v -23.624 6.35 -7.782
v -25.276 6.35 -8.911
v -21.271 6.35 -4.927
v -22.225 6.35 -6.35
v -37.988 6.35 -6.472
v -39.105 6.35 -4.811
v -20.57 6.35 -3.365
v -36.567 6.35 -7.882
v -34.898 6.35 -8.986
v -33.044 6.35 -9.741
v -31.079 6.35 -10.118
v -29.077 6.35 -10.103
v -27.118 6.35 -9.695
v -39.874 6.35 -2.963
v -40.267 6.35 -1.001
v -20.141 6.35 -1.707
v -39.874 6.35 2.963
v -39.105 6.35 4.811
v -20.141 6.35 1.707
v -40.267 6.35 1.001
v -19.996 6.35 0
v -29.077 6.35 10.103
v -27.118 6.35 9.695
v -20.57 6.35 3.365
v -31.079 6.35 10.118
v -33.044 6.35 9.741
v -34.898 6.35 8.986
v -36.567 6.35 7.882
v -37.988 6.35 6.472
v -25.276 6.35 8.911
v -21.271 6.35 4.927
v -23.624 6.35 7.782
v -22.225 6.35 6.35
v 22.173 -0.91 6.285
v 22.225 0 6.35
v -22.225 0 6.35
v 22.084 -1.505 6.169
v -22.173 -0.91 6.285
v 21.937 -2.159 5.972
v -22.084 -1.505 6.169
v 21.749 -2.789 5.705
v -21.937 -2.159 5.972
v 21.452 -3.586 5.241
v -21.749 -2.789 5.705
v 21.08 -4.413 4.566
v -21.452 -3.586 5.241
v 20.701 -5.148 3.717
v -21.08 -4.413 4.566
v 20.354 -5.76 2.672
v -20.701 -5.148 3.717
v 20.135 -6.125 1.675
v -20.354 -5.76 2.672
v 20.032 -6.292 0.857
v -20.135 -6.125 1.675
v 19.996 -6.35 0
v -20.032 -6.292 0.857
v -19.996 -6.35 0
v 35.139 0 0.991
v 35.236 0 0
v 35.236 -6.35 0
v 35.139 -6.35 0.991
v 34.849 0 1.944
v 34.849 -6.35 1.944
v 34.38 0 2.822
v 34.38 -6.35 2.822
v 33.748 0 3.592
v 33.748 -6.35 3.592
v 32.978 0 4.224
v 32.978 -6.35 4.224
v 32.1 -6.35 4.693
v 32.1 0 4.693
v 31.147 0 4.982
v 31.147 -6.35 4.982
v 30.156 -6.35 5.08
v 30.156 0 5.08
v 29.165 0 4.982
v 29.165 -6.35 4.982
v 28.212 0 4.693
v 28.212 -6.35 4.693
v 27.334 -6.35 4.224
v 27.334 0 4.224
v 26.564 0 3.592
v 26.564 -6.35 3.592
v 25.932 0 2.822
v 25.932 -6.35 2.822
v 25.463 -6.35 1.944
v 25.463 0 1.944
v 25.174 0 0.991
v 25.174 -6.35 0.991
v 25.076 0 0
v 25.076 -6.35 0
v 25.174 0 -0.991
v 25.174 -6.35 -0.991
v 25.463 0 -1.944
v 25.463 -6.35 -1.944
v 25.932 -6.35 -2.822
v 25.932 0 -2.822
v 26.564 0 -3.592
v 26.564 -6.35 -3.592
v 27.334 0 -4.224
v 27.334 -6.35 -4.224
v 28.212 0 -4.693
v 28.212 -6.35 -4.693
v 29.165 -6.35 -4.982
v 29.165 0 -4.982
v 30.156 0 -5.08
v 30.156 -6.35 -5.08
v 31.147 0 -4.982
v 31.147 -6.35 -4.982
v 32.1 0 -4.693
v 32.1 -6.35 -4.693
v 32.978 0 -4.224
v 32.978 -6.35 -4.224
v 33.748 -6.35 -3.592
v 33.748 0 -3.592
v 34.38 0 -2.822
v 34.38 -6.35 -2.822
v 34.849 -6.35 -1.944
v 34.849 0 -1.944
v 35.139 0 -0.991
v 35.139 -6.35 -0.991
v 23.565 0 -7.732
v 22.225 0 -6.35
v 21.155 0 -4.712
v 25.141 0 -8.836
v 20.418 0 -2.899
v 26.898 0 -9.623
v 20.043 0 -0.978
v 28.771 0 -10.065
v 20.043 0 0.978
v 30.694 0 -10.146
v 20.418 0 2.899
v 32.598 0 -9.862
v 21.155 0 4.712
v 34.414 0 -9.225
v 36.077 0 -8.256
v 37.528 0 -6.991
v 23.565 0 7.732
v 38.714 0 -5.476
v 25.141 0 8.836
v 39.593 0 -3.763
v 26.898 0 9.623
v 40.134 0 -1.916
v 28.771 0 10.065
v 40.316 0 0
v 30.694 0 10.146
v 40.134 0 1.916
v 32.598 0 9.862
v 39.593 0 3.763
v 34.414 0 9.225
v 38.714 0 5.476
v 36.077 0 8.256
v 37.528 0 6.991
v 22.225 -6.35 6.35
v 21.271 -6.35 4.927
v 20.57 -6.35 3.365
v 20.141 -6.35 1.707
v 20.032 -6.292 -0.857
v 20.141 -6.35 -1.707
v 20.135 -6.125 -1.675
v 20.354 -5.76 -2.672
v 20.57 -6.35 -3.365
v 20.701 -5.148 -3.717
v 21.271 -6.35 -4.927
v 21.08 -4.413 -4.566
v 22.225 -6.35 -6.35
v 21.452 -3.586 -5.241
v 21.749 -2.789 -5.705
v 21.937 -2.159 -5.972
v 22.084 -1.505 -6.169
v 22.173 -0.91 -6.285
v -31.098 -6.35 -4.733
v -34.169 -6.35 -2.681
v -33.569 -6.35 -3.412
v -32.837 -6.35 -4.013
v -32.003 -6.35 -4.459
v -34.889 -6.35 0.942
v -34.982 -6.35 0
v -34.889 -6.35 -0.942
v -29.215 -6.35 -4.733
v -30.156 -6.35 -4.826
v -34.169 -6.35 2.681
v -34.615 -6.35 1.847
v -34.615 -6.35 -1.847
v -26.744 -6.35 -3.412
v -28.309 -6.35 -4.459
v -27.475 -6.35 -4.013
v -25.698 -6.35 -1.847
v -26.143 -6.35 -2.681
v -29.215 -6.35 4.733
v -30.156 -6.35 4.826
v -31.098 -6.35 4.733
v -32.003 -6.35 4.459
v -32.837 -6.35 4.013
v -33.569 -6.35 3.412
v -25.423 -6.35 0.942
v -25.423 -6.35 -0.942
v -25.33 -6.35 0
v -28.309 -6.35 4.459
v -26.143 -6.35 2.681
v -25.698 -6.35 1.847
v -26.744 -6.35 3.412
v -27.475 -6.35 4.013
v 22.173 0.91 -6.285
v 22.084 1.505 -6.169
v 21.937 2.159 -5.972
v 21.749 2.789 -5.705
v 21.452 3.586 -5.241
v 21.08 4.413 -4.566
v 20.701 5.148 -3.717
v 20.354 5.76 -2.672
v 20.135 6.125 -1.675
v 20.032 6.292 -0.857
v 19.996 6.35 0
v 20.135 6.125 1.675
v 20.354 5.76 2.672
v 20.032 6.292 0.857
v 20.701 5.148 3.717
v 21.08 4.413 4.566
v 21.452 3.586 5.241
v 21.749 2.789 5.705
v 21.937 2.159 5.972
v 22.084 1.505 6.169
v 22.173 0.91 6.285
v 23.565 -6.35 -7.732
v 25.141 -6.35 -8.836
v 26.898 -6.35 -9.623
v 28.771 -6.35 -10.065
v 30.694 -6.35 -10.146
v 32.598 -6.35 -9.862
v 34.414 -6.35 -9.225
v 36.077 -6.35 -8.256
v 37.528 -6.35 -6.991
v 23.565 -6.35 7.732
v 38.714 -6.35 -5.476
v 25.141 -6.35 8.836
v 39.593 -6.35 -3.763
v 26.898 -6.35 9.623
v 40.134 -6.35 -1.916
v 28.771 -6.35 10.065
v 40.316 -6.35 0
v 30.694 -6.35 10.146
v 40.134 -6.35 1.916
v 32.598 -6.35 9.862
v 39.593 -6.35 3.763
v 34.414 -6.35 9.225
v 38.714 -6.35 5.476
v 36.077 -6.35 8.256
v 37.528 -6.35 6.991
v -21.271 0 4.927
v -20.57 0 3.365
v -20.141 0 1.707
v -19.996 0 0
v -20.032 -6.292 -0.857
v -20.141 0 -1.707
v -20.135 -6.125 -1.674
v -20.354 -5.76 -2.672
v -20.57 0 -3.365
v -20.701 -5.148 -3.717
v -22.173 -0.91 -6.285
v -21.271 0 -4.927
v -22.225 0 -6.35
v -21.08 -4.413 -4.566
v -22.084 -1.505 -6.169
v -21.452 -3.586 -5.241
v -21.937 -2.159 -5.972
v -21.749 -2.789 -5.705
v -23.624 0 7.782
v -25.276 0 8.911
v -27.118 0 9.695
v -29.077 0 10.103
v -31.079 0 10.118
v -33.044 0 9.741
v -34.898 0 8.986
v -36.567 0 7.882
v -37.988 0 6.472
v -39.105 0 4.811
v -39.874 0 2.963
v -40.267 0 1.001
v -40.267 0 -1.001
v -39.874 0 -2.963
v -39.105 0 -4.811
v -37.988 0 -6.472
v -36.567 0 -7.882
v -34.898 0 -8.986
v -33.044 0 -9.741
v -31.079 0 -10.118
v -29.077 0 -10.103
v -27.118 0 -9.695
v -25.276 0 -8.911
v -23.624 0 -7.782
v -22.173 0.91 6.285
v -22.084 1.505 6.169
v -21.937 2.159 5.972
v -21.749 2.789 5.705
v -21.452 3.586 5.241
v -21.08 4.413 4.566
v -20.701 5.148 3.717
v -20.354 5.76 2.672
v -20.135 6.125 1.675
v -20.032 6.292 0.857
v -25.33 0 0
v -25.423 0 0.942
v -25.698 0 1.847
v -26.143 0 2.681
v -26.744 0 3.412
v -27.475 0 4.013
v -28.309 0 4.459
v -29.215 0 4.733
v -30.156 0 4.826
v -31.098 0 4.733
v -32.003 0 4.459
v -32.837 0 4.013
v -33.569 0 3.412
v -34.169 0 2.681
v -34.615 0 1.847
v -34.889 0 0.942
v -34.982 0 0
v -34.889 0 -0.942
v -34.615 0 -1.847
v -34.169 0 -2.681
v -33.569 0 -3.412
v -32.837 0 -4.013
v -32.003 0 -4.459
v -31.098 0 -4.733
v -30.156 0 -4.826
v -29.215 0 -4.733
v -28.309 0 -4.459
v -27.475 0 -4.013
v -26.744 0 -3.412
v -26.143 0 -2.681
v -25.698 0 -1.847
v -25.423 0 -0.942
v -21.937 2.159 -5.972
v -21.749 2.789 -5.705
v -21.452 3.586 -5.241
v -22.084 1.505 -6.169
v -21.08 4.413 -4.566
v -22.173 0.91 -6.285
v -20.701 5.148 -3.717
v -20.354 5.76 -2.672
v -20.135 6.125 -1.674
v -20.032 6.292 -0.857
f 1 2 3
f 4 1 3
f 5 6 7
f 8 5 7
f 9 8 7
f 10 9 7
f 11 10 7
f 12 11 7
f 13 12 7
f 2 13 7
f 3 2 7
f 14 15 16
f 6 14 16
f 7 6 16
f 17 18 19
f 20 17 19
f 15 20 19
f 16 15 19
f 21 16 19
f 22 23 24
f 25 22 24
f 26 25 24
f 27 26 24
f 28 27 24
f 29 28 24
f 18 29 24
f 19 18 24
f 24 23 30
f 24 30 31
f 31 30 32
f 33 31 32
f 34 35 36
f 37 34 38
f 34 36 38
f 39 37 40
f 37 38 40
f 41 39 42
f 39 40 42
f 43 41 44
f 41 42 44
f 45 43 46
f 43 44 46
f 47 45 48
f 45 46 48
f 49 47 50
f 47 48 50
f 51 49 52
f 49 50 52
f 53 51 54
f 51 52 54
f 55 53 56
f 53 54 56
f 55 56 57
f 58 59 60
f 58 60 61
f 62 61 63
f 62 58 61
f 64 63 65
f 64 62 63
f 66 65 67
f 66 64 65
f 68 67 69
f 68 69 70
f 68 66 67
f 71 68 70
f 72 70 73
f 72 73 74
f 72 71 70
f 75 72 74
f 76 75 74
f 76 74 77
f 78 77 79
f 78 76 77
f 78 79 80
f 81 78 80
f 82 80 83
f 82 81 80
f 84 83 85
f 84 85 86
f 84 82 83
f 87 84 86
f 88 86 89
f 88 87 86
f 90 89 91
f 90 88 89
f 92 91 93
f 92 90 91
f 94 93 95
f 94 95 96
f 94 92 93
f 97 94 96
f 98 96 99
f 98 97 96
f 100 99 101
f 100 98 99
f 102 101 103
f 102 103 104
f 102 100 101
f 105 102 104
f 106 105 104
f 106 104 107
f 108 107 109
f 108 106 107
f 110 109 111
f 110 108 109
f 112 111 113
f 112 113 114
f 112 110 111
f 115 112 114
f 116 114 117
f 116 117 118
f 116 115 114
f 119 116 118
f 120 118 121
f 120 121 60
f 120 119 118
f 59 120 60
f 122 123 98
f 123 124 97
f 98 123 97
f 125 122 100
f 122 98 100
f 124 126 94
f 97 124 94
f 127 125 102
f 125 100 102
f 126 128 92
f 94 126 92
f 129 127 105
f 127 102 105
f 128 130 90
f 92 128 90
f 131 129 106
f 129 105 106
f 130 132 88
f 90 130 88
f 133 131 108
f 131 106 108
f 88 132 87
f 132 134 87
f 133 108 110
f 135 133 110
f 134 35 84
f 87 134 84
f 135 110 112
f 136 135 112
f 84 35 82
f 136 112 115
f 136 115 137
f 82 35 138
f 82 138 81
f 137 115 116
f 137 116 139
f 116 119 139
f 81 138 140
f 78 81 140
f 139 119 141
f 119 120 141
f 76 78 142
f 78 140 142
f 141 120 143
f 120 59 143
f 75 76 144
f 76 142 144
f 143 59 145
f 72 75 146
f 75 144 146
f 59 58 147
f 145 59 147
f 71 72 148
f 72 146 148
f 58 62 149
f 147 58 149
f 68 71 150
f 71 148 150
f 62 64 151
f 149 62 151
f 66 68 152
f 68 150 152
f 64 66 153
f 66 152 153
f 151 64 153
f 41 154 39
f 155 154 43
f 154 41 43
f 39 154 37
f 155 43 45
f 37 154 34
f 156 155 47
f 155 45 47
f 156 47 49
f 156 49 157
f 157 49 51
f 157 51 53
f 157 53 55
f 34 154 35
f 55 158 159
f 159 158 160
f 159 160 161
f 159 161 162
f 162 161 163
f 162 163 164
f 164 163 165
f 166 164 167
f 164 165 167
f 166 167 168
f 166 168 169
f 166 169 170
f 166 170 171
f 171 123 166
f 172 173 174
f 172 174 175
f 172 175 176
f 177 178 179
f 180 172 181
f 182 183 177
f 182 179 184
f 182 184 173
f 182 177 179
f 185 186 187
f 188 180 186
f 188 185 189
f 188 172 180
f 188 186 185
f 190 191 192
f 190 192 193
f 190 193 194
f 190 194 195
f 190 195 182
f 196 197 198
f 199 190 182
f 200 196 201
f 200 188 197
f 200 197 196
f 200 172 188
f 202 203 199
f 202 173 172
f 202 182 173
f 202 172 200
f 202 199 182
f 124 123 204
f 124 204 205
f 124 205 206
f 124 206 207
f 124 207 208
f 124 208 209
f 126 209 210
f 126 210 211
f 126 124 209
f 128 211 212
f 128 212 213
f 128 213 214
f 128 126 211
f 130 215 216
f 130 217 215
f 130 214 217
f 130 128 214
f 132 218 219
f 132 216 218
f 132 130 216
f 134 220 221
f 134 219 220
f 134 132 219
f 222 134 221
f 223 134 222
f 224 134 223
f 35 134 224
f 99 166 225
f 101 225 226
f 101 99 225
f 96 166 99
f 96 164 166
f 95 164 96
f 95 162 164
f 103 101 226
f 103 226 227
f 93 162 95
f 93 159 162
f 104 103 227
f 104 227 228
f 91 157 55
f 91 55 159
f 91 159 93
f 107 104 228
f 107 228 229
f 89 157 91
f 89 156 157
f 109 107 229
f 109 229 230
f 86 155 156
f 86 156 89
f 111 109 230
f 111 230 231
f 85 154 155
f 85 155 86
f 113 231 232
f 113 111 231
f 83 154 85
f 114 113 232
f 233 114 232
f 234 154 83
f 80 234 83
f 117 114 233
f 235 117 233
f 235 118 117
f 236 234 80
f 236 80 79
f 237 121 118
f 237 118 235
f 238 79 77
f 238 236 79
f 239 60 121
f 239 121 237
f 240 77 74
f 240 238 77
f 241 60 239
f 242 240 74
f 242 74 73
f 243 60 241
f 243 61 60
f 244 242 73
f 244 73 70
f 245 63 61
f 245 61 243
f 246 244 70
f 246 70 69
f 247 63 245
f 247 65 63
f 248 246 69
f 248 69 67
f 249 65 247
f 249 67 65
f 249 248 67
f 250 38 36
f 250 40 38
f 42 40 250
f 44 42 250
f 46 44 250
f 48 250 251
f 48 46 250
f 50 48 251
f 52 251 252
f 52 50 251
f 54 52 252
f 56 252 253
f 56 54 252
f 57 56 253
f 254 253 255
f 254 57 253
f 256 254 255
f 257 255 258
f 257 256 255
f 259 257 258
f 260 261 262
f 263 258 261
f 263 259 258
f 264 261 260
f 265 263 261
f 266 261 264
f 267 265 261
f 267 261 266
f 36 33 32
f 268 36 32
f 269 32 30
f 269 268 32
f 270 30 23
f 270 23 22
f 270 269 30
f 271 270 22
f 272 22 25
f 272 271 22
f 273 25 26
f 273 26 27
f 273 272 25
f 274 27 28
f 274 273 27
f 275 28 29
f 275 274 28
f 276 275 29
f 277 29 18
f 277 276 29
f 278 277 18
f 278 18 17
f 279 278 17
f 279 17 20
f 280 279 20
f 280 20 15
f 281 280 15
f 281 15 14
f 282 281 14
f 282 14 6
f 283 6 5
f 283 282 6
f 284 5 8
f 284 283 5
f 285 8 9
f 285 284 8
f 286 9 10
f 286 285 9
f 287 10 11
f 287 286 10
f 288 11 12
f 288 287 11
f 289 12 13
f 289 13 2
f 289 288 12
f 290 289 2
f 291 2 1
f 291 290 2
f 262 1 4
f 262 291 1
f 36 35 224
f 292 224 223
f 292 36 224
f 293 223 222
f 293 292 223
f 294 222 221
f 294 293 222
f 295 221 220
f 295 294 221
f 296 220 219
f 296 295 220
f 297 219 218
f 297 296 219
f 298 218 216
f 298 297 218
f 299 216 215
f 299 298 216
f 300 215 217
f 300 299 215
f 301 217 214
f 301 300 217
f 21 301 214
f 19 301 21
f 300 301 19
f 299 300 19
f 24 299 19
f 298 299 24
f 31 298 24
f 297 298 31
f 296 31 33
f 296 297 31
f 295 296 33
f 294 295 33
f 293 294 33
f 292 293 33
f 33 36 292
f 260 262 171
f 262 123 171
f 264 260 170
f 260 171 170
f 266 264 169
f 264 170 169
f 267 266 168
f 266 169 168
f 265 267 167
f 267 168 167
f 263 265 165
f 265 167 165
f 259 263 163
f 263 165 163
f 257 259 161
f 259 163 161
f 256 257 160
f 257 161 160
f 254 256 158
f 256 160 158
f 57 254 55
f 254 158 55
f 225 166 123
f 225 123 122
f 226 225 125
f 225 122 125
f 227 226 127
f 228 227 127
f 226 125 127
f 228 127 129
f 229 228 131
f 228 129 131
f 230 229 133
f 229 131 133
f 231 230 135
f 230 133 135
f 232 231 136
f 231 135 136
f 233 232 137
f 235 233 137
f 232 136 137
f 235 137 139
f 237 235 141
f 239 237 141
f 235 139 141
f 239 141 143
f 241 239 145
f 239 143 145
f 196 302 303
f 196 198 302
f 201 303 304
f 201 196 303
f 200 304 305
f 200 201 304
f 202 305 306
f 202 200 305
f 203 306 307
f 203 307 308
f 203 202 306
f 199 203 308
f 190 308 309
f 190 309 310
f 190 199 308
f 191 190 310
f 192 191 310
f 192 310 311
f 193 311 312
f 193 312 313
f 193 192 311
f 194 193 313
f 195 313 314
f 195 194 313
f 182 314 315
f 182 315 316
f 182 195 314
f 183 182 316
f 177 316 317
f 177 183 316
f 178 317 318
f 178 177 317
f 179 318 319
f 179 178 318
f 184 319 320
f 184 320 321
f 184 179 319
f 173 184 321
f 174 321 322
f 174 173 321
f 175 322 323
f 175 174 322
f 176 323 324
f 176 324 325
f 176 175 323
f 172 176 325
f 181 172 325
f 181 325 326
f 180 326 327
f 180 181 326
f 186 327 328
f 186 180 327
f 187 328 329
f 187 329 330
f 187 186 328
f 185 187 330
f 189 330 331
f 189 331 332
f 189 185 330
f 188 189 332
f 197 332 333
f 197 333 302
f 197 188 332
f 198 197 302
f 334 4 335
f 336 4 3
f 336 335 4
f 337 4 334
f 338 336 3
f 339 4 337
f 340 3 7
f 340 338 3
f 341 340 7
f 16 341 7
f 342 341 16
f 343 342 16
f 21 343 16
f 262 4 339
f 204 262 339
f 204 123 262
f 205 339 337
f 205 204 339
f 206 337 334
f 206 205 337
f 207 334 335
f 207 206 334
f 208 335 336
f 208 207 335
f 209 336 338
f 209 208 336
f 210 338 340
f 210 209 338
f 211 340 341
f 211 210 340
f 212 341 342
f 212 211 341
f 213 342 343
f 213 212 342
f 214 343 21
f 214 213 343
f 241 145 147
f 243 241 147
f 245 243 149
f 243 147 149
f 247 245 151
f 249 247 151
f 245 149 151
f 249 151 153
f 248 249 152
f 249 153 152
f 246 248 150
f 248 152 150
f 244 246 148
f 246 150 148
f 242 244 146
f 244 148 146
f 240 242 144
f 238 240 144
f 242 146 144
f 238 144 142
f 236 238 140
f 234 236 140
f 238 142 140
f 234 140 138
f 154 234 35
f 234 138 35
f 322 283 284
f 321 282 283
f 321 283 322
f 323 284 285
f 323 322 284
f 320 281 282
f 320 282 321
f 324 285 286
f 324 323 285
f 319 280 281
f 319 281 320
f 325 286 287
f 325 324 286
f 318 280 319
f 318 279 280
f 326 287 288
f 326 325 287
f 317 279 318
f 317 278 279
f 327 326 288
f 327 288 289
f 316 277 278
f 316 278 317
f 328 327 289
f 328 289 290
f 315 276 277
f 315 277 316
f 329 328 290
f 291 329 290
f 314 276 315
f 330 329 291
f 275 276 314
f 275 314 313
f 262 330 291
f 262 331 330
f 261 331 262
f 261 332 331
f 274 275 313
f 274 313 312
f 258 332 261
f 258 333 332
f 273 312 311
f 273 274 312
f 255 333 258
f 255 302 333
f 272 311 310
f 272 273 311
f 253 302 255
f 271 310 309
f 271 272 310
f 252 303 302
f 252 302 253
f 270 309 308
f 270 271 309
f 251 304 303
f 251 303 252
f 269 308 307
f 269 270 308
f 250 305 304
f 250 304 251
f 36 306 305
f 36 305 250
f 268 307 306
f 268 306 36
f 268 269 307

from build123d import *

# Parameters (mm, degrees)
F1_DEPTH = 6.35
F2_R     = 6.3499
F0_R     = 5.08
F3_DEPTH = 6.35
F0_R_2   = 4.826
F4_DEPTH = 6.35
F5_DEPTH = 6.35


# Not quite as in the source:
# - a fillet or chamfer is up to 0.001 mm smaller than in the source, because OpenCascade refuses the exact size


with BuildPart() as f1:
    # F0 (on Front) → F1 (new body, symmetric)
    with BuildSketch(Plane.XZ):
        with BuildLine():
            Line((22.225, 6.35), (-22.225, 6.35))
            ThreePointArc((-22.225, 6.35), (-20.5695407024, 3.3649028089), (-19.996147458, 0))
            ThreePointArc((-19.996147458, 0), (-20.5695407024, -3.3649028089), (-22.225, -6.35))
            Line((-22.225, -6.35), (22.225, -6.35))
            ThreePointArc((22.225, -6.35), (19.996147458, 0), (22.225, 6.35))
        make_face()
    extrude(amount=F1_DEPTH, both=True)

    # F2 (radius 6.35 in the source; OpenCascade refuses exactly that, so slightly less here)
    f2_edges = [f1.edges().sort_by_distance(p)[0] for p in [
        (0, -6.35, 6.35),
        (0, 6.35, 6.35),
        (0, -6.35, -6.35),
        (0, 6.35, -6.35),
    ]]
    fillet(f2_edges, radius=F2_R)

    # F0 (on Front) → F3 (join)
    with BuildSketch(Plane.XZ):
        with BuildLine():
            ThreePointArc((40.316147458, 0), (33.5210502669, 9.5866067556), (22.225, 6.35))
            Line((22.225, 6.35), (22.225, -6.35))
            ThreePointArc((22.225, -6.35), (33.5210502669, -9.5866067556), (40.316147458, 0))
        make_face()
        with Locations((30.156147458, 0)):
            Circle(F0_R, mode=Mode.SUBTRACT)
        with BuildLine():
            Line((22.225, -6.35), (22.225, 6.35))
            ThreePointArc((22.225, 6.35), (19.996147458, 0), (22.225, -6.35))
        make_face()
    extrude(amount=F3_DEPTH)

    # F0 (on Front) → F4 (join)
    with BuildSketch(Plane.XZ):
        with BuildLine():
            Line((-22.225, -6.35), (-22.225, 6.35))
            ThreePointArc((-22.225, 6.35), (-40.316147458, 0), (-22.225, -6.35))
        make_face()
        with Locations((-30.156147458, 0)):
            Circle(F0_R_2, mode=Mode.SUBTRACT)
        with BuildLine():
            ThreePointArc((-19.996147458, 0), (-20.5695407024, 3.3649028089), (-22.225, 6.35))
            Line((-22.225, 6.35), (-22.225, -6.35))
            ThreePointArc((-22.225, -6.35), (-20.5695407024, -3.3649028089), (-19.996147458, 0))
        make_face()
    extrude(amount=-F4_DEPTH)

    # F0 (on Front) → F5 (join, symmetric)
    with BuildSketch(Plane.XZ):
        with Locations((-30.156147458, 0)):
            Circle(F0_R_2)
    extrude(amount=F5_DEPTH, both=True)


solid = f1.part
